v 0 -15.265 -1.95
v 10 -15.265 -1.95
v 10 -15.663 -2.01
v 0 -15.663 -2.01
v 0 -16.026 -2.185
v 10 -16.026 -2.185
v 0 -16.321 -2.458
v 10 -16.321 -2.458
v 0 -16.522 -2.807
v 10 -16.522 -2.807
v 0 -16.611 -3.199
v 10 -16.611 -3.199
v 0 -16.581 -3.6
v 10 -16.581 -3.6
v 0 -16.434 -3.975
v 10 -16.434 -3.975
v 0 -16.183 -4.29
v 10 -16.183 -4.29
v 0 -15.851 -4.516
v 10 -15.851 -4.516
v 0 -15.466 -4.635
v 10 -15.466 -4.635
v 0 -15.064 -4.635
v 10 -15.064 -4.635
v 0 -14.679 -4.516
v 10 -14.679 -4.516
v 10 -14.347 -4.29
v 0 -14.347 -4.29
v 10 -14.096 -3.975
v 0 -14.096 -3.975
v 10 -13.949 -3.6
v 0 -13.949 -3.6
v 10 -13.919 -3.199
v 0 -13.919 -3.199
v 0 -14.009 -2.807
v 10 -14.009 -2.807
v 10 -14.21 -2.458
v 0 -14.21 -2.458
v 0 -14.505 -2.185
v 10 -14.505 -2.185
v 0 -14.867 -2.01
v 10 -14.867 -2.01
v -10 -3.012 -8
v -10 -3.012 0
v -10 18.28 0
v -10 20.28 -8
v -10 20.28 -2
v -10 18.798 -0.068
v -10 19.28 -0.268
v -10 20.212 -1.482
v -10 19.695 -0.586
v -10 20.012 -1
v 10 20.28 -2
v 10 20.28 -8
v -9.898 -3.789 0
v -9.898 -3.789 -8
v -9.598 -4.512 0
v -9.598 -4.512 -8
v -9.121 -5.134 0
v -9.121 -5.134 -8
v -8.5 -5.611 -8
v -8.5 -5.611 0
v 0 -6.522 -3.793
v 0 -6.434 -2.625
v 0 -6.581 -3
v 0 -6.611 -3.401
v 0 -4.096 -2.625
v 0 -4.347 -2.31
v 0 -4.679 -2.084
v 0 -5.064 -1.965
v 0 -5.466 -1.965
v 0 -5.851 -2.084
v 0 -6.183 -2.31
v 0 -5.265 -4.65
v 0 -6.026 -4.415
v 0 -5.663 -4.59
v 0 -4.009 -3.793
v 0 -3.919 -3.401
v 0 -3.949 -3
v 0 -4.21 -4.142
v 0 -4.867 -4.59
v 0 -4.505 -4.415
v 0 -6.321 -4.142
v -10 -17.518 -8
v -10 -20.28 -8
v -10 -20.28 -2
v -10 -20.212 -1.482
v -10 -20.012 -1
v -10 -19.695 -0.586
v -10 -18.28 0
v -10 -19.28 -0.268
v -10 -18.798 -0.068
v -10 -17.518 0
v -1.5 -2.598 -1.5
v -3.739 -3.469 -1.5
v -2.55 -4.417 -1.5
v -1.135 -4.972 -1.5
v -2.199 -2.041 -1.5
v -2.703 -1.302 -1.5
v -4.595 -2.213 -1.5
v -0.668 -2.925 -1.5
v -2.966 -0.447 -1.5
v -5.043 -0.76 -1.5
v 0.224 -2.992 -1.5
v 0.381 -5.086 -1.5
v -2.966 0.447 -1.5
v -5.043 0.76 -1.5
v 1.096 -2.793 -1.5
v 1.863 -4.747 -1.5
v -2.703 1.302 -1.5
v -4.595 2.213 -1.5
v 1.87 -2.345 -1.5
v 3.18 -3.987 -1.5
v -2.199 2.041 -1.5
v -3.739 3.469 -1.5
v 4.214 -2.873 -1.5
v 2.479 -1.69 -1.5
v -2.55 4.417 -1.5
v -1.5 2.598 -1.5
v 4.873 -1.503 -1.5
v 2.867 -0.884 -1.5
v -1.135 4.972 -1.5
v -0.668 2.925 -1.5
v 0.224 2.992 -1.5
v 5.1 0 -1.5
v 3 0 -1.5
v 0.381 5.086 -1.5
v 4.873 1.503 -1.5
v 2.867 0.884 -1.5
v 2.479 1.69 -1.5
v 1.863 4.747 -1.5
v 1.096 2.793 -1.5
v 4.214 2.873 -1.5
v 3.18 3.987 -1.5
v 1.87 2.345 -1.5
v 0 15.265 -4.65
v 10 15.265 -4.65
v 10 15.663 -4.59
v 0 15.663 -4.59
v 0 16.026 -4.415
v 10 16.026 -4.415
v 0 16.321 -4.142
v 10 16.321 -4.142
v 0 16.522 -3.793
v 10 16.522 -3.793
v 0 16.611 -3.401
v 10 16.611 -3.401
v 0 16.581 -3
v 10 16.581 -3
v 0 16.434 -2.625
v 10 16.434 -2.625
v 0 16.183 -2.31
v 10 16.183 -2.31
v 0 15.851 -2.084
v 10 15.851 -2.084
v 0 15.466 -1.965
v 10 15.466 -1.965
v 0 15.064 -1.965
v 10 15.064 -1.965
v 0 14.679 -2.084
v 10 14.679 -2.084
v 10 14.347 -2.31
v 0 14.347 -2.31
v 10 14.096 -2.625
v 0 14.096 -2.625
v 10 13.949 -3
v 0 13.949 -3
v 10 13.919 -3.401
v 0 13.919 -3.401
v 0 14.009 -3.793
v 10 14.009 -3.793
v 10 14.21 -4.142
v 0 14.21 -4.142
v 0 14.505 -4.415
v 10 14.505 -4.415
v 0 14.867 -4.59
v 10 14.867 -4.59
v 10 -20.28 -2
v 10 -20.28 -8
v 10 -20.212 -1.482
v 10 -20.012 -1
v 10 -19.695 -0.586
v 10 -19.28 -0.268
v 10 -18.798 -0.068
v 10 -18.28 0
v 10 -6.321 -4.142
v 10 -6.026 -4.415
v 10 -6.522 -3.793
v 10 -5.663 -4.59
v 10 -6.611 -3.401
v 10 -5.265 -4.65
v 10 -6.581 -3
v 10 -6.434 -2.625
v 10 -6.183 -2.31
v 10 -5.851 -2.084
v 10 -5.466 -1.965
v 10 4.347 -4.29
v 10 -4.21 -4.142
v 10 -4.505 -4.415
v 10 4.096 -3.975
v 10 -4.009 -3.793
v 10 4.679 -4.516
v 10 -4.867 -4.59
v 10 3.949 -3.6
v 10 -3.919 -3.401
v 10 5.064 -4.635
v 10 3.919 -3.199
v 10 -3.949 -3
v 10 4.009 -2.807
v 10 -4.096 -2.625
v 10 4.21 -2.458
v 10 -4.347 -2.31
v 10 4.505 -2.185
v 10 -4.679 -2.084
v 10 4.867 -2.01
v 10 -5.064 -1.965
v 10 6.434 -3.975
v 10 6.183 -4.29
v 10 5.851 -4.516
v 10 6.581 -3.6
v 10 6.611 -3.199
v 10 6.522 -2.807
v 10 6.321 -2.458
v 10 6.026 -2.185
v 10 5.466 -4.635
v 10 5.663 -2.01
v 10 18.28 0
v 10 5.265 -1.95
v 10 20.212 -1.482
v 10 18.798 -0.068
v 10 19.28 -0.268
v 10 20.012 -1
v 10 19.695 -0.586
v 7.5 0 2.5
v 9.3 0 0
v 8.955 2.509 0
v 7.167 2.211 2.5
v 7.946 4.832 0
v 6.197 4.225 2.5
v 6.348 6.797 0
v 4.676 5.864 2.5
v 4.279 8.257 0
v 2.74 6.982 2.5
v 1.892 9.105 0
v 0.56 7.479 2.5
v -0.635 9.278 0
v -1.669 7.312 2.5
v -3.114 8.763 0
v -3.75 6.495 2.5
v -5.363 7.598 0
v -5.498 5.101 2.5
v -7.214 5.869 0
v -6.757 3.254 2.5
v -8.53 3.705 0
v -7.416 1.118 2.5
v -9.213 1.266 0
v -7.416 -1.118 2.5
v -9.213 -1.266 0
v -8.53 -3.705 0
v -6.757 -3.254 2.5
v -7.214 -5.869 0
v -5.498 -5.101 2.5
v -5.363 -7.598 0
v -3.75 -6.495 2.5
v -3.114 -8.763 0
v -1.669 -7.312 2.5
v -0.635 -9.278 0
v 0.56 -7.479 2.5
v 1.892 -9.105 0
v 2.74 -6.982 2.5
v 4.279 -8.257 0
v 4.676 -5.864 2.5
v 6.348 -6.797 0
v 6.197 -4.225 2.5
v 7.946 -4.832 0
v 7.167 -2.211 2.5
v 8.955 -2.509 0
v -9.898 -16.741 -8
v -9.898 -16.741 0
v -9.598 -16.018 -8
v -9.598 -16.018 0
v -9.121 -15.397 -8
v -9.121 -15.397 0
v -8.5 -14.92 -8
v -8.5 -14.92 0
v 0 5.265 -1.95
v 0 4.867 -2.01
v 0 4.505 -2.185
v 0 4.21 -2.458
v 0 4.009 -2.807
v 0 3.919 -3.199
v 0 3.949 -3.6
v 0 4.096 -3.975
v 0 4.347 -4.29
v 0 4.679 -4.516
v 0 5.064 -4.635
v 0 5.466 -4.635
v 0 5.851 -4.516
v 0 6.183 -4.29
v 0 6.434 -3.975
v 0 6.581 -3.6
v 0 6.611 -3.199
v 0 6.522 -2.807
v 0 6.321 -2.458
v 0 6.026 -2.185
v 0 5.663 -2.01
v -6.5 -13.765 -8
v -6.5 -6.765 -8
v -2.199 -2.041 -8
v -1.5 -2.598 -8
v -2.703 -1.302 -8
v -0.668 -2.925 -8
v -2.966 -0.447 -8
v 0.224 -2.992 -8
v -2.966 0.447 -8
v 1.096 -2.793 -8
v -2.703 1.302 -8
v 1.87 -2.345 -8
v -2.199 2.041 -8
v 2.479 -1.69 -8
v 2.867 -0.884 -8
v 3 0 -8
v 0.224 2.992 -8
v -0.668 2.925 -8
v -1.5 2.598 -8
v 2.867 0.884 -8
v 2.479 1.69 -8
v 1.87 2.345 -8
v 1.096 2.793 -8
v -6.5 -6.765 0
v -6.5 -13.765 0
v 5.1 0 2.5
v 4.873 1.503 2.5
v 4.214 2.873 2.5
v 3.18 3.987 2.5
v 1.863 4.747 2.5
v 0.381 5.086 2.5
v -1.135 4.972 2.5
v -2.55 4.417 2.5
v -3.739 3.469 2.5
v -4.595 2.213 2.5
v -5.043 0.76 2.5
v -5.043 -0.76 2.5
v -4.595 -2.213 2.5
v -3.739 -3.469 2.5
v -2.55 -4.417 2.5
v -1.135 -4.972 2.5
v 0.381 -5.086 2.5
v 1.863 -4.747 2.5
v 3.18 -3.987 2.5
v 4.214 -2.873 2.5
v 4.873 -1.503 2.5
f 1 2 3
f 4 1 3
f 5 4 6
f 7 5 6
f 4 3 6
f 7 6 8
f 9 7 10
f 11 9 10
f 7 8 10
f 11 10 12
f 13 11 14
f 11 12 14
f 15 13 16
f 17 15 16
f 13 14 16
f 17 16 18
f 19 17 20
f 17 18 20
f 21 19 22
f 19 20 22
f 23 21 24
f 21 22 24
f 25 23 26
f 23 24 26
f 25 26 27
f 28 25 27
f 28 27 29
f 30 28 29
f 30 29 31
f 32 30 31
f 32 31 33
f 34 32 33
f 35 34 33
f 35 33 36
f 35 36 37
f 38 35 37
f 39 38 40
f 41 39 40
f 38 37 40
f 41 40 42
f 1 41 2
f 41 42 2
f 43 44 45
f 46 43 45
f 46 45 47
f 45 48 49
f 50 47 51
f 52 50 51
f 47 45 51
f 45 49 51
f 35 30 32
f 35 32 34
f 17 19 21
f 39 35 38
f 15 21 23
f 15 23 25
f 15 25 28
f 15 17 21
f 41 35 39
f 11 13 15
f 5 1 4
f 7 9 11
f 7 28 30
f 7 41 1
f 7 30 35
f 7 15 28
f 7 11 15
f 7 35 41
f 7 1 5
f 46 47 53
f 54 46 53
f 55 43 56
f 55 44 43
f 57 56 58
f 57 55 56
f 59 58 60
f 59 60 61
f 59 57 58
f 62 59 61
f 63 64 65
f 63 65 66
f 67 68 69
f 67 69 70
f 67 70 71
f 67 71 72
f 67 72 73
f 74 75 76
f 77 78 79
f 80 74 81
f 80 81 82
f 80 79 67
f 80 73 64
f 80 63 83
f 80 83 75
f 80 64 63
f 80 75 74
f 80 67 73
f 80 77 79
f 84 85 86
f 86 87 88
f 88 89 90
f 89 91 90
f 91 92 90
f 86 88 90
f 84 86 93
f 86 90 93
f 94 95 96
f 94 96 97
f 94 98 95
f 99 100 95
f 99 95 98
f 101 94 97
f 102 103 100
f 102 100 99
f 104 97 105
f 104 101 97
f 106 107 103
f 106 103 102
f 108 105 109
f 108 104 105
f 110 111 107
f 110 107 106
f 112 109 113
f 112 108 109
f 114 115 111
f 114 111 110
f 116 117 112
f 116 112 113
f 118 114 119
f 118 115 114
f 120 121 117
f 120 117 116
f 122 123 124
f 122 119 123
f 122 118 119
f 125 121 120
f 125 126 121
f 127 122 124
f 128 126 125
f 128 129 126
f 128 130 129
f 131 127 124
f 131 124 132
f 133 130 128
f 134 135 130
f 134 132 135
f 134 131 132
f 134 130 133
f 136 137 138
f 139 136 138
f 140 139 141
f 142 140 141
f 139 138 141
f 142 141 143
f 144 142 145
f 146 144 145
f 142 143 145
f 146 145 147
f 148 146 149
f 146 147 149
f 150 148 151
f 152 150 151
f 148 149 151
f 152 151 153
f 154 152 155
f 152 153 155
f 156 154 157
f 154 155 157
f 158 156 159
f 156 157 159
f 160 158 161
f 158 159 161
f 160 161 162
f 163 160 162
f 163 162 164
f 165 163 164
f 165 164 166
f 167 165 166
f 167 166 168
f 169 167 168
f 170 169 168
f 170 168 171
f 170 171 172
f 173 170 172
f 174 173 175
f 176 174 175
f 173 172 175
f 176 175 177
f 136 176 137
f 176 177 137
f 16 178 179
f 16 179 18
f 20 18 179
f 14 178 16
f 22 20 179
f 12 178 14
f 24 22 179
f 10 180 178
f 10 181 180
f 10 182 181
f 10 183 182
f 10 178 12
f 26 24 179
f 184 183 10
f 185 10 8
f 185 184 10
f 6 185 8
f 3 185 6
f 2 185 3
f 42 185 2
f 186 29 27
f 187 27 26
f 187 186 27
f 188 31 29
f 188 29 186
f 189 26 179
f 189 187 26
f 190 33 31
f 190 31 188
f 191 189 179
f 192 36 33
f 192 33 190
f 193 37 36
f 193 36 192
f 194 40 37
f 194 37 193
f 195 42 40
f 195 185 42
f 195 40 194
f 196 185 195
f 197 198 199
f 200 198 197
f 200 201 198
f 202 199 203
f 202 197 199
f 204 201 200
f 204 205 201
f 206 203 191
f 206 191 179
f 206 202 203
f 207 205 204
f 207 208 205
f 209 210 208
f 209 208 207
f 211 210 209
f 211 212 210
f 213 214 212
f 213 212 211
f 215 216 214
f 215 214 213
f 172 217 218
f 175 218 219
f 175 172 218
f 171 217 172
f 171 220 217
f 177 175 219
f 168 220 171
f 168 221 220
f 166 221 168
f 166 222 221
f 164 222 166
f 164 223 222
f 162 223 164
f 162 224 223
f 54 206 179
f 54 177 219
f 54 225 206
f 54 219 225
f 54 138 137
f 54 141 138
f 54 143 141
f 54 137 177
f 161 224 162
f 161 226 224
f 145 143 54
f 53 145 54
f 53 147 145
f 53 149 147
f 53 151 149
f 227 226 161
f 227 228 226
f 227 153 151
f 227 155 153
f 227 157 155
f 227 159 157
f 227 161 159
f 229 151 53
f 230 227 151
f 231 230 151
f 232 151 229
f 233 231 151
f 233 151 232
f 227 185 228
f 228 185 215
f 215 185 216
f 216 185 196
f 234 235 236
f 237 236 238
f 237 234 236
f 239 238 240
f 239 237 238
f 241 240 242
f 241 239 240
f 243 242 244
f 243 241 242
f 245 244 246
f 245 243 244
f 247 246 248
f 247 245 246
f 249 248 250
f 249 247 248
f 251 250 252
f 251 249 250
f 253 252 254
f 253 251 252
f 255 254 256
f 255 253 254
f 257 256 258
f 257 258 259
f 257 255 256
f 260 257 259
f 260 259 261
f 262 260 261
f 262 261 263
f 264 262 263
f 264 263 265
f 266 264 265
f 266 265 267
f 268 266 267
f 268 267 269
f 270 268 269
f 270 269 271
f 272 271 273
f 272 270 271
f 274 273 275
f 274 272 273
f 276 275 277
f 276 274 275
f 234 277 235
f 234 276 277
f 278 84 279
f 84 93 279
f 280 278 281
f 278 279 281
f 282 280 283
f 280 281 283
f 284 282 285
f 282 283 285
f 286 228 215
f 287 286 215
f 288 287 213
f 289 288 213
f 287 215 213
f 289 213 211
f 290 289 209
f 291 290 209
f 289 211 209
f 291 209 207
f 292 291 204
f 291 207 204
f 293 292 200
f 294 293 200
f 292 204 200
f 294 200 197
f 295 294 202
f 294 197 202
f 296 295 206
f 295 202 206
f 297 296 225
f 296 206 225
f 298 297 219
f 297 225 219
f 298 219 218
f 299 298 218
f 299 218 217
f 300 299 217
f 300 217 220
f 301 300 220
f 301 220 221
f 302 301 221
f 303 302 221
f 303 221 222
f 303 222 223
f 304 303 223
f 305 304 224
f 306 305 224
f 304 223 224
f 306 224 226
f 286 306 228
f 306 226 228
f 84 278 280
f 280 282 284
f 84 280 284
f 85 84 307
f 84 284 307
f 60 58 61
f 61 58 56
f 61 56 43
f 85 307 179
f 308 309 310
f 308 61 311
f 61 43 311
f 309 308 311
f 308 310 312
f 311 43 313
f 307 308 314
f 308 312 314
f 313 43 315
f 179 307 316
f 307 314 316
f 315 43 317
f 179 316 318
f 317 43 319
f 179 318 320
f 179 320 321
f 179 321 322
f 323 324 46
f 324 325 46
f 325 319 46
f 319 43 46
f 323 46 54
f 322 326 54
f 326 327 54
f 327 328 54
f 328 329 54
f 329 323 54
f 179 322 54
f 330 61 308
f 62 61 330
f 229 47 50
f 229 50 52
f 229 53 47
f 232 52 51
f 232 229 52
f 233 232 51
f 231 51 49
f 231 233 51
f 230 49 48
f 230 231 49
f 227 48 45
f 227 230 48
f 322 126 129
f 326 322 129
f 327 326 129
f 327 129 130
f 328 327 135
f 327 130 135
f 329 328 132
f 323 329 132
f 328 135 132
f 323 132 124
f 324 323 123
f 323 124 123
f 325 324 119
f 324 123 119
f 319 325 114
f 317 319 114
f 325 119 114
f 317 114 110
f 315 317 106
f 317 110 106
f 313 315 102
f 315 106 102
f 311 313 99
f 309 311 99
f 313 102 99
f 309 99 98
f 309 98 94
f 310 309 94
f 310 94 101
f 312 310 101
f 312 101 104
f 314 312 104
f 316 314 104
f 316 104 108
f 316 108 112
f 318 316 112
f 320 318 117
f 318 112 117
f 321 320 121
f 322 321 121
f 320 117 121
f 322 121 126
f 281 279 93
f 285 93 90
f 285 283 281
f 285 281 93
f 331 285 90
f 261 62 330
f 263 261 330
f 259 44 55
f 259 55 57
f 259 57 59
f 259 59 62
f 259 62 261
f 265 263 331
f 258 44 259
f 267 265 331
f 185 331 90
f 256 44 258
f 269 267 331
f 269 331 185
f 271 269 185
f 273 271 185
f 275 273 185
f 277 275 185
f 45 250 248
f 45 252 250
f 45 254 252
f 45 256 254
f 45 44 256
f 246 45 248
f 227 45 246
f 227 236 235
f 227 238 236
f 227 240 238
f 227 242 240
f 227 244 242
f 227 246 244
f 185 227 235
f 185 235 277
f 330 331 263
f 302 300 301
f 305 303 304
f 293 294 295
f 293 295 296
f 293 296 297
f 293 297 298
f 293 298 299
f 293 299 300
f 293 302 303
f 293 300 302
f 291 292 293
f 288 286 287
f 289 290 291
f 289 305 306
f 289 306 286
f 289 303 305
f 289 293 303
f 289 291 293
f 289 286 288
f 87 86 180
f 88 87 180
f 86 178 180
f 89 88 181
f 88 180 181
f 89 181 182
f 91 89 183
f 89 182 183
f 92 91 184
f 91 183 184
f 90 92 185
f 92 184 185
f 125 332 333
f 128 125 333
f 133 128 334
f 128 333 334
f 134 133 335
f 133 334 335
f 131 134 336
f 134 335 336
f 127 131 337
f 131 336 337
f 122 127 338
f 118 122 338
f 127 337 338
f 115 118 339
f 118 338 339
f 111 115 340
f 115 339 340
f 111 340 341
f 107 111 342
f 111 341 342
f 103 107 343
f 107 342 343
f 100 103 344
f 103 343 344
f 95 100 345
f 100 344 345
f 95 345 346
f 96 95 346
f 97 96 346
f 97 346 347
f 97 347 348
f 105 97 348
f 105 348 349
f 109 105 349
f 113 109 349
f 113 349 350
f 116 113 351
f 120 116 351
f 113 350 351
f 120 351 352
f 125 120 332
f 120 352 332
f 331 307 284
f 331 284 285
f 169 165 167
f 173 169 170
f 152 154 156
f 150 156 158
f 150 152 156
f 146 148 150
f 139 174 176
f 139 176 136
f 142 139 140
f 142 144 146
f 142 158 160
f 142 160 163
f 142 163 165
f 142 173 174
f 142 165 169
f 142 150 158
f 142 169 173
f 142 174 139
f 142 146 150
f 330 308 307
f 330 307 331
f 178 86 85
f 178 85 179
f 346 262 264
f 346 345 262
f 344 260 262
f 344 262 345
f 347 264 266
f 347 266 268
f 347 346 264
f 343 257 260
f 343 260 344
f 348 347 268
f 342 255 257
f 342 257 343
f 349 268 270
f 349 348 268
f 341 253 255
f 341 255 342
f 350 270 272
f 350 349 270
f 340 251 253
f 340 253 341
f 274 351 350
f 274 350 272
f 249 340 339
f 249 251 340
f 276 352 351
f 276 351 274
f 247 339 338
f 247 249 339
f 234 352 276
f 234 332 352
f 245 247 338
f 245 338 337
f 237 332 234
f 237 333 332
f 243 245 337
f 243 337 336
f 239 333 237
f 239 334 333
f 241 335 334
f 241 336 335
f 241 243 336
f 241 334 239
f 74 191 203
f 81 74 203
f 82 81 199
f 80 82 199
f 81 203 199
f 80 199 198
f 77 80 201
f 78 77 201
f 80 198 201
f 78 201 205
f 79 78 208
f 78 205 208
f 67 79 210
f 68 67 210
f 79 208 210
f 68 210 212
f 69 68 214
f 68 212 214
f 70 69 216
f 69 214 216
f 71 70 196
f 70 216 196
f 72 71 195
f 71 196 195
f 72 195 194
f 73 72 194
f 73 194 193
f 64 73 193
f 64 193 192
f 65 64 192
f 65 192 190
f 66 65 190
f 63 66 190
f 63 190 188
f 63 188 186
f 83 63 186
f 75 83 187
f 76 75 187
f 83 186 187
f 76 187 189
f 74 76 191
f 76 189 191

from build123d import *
from OCP.BRepFilletAPI import BRepFilletAPI_MakeChamfer

# Parameters (mm, degrees)
SKETCH1_W           = 20
SKETCH1_H           = 40.56076
BOSS_EXTRUDE1_DEPTH = 8
SKETCH6_R           = 1.35
CUT_EXTRUDE1_DEPTH  = 10
SKETCH8_R           = 7.5
BOSS_EXTRUDE2_DEPTH = 2.5
SKETCH9_R           = 5.1
CUT_EXTRUDE3_DEPTH  = 4
SKETCH10_R          = 3
CUT_EXTRUDE4_DEPTH  = 6.5
FILLET1_R           = 2
CHAMFER1_SIZE2      = 2.5
CHAMFER1_SIZE       = 1.8
SKETCH11_W          = 8
SKETCH11_H          = 7
CUT_EXTRUDE5_DEPTH  = 3.5
CHAMFER2_SIZE       = 2.020725942
CHAMFER2_SIZE_2     = 3.5
FILLET2_R           = 3


with BuildPart() as part:
    # Sketch1 → Boss-Extrude1 (new body)
    with BuildSketch(Plane.XY):
        Rectangle(SKETCH1_W, SKETCH1_H)
    extrude(amount=-BOSS_EXTRUDE1_DEPTH)

    # Sketch6 → Cut-Extrude1 (cut)
    with BuildSketch(Plane(origin=(10, 0, 0), x_dir=(0, 0, -1), z_dir=(1, 0, 0))):
        with Locations(Location((3.3, -15.26519, 0), (0, 0, 180))):
            Circle(SKETCH6_R)
        with Locations((3.3, -5.26519)):
            Circle(SKETCH6_R)
        with Locations((3.3, 15.26519)):
            Circle(SKETCH6_R)
        with Locations(Location((3.3, 5.26519, 0), (0, 0, 180))):
            Circle(SKETCH6_R)
    extrude(amount=-CUT_EXTRUDE1_DEPTH, mode=Mode.SUBTRACT)

    # Sketch8 → Boss-Extrude2 (add)
    with BuildSketch(Plane.XY):
        Circle(SKETCH8_R)
    extrude(amount=BOSS_EXTRUDE2_DEPTH)

    # Sketch9 → Cut-Extrude3 (cut)
    with BuildSketch(Plane.XY.offset(2.5)):
        Circle(SKETCH9_R)
    extrude(amount=-CUT_EXTRUDE3_DEPTH, mode=Mode.SUBTRACT)

    # Sketch10 → Cut-Extrude4 (cut)
    with BuildSketch(Plane.XY.offset(-1.5)):
        Circle(SKETCH10_R)
    extrude(amount=-CUT_EXTRUDE4_DEPTH, mode=Mode.SUBTRACT)

    # Fillet1
    fillet1_edges = [part.edges().sort_by_distance(p)[0] for p in [
        (0, -20.28038, 0),
        (0, 20.28038, 0),
    ]]
    fillet(fillet1_edges, radius=FILLET1_R)

    # Chamfer1
    chamfer1_edges = [part.edges().sort_by_distance(p)[0] for p in [
        (-7.5, 0, 0),
    ]]
    chamfer1_side = [part.faces().sort_by_distance(p)[0] for p in [
        (-7.536, 0, 0),
    ]]
    chamfer(chamfer1_edges, length=CHAMFER1_SIZE - 0.0001, length2=CHAMFER1_SIZE2 - 0.0001, reference=chamfer1_side[0])  # a hair under: the kernel refuses the full size

    # Sketch11 → Cut-Extrude5 (cut)
    with BuildSketch(Plane.ZY.offset(10)):
        with Locations((-4, -10.26517)):
            Rectangle(SKETCH11_W, SKETCH11_H)
    extrude(amount=-CUT_EXTRUDE5_DEPTH, mode=Mode.SUBTRACT)

    # Chamfer2
    chamfer2_edges_1 = [part.edges().sort_by_distance(p)[0] for p in [
        (-10, -13.76517, -4),
    ]]
    chamfer2_side_1 = [part.faces().sort_by_distance(p)[0] for p in [
        (-10, -13.805584519, -4),
    ]]
    chamfer2_edges_2 = [part.edges().sort_by_distance(p)[0] for p in [
        (-10, -6.76517, -4),
    ]]
    chamfer2_side_2 = [part.faces().sort_by_distance(p)[0] for p in [
        (-9.959585481, -6.76517, -4),
    ]]
    chamfer2 = BRepFilletAPI_MakeChamfer(part.part.solid().wrapped)
    for e in chamfer2_edges_1:
        chamfer2.Add(CHAMFER2_SIZE - 0.0001, CHAMFER2_SIZE_2 - 0.0001, e.wrapped, chamfer2_side_1[0].wrapped)
    for e in chamfer2_edges_2:
        chamfer2.Add(CHAMFER2_SIZE_2 - 0.0001, CHAMFER2_SIZE - 0.0001, e.wrapped, chamfer2_side_2[0].wrapped)
    add(Compound.cast(chamfer2.Shape()), mode=Mode.REPLACE)  # a hair under: the kernel refuses the full size

    # Fillet2
    fillet2_edges = [part.edges().sort_by_distance(p)[0] for p in [
        (-10, -15.785795942, -4),
        (-10, -4.744544058, -4),
    ]]
    fillet(fillet2_edges, radius=FILLET2_R)


solid = part.part
